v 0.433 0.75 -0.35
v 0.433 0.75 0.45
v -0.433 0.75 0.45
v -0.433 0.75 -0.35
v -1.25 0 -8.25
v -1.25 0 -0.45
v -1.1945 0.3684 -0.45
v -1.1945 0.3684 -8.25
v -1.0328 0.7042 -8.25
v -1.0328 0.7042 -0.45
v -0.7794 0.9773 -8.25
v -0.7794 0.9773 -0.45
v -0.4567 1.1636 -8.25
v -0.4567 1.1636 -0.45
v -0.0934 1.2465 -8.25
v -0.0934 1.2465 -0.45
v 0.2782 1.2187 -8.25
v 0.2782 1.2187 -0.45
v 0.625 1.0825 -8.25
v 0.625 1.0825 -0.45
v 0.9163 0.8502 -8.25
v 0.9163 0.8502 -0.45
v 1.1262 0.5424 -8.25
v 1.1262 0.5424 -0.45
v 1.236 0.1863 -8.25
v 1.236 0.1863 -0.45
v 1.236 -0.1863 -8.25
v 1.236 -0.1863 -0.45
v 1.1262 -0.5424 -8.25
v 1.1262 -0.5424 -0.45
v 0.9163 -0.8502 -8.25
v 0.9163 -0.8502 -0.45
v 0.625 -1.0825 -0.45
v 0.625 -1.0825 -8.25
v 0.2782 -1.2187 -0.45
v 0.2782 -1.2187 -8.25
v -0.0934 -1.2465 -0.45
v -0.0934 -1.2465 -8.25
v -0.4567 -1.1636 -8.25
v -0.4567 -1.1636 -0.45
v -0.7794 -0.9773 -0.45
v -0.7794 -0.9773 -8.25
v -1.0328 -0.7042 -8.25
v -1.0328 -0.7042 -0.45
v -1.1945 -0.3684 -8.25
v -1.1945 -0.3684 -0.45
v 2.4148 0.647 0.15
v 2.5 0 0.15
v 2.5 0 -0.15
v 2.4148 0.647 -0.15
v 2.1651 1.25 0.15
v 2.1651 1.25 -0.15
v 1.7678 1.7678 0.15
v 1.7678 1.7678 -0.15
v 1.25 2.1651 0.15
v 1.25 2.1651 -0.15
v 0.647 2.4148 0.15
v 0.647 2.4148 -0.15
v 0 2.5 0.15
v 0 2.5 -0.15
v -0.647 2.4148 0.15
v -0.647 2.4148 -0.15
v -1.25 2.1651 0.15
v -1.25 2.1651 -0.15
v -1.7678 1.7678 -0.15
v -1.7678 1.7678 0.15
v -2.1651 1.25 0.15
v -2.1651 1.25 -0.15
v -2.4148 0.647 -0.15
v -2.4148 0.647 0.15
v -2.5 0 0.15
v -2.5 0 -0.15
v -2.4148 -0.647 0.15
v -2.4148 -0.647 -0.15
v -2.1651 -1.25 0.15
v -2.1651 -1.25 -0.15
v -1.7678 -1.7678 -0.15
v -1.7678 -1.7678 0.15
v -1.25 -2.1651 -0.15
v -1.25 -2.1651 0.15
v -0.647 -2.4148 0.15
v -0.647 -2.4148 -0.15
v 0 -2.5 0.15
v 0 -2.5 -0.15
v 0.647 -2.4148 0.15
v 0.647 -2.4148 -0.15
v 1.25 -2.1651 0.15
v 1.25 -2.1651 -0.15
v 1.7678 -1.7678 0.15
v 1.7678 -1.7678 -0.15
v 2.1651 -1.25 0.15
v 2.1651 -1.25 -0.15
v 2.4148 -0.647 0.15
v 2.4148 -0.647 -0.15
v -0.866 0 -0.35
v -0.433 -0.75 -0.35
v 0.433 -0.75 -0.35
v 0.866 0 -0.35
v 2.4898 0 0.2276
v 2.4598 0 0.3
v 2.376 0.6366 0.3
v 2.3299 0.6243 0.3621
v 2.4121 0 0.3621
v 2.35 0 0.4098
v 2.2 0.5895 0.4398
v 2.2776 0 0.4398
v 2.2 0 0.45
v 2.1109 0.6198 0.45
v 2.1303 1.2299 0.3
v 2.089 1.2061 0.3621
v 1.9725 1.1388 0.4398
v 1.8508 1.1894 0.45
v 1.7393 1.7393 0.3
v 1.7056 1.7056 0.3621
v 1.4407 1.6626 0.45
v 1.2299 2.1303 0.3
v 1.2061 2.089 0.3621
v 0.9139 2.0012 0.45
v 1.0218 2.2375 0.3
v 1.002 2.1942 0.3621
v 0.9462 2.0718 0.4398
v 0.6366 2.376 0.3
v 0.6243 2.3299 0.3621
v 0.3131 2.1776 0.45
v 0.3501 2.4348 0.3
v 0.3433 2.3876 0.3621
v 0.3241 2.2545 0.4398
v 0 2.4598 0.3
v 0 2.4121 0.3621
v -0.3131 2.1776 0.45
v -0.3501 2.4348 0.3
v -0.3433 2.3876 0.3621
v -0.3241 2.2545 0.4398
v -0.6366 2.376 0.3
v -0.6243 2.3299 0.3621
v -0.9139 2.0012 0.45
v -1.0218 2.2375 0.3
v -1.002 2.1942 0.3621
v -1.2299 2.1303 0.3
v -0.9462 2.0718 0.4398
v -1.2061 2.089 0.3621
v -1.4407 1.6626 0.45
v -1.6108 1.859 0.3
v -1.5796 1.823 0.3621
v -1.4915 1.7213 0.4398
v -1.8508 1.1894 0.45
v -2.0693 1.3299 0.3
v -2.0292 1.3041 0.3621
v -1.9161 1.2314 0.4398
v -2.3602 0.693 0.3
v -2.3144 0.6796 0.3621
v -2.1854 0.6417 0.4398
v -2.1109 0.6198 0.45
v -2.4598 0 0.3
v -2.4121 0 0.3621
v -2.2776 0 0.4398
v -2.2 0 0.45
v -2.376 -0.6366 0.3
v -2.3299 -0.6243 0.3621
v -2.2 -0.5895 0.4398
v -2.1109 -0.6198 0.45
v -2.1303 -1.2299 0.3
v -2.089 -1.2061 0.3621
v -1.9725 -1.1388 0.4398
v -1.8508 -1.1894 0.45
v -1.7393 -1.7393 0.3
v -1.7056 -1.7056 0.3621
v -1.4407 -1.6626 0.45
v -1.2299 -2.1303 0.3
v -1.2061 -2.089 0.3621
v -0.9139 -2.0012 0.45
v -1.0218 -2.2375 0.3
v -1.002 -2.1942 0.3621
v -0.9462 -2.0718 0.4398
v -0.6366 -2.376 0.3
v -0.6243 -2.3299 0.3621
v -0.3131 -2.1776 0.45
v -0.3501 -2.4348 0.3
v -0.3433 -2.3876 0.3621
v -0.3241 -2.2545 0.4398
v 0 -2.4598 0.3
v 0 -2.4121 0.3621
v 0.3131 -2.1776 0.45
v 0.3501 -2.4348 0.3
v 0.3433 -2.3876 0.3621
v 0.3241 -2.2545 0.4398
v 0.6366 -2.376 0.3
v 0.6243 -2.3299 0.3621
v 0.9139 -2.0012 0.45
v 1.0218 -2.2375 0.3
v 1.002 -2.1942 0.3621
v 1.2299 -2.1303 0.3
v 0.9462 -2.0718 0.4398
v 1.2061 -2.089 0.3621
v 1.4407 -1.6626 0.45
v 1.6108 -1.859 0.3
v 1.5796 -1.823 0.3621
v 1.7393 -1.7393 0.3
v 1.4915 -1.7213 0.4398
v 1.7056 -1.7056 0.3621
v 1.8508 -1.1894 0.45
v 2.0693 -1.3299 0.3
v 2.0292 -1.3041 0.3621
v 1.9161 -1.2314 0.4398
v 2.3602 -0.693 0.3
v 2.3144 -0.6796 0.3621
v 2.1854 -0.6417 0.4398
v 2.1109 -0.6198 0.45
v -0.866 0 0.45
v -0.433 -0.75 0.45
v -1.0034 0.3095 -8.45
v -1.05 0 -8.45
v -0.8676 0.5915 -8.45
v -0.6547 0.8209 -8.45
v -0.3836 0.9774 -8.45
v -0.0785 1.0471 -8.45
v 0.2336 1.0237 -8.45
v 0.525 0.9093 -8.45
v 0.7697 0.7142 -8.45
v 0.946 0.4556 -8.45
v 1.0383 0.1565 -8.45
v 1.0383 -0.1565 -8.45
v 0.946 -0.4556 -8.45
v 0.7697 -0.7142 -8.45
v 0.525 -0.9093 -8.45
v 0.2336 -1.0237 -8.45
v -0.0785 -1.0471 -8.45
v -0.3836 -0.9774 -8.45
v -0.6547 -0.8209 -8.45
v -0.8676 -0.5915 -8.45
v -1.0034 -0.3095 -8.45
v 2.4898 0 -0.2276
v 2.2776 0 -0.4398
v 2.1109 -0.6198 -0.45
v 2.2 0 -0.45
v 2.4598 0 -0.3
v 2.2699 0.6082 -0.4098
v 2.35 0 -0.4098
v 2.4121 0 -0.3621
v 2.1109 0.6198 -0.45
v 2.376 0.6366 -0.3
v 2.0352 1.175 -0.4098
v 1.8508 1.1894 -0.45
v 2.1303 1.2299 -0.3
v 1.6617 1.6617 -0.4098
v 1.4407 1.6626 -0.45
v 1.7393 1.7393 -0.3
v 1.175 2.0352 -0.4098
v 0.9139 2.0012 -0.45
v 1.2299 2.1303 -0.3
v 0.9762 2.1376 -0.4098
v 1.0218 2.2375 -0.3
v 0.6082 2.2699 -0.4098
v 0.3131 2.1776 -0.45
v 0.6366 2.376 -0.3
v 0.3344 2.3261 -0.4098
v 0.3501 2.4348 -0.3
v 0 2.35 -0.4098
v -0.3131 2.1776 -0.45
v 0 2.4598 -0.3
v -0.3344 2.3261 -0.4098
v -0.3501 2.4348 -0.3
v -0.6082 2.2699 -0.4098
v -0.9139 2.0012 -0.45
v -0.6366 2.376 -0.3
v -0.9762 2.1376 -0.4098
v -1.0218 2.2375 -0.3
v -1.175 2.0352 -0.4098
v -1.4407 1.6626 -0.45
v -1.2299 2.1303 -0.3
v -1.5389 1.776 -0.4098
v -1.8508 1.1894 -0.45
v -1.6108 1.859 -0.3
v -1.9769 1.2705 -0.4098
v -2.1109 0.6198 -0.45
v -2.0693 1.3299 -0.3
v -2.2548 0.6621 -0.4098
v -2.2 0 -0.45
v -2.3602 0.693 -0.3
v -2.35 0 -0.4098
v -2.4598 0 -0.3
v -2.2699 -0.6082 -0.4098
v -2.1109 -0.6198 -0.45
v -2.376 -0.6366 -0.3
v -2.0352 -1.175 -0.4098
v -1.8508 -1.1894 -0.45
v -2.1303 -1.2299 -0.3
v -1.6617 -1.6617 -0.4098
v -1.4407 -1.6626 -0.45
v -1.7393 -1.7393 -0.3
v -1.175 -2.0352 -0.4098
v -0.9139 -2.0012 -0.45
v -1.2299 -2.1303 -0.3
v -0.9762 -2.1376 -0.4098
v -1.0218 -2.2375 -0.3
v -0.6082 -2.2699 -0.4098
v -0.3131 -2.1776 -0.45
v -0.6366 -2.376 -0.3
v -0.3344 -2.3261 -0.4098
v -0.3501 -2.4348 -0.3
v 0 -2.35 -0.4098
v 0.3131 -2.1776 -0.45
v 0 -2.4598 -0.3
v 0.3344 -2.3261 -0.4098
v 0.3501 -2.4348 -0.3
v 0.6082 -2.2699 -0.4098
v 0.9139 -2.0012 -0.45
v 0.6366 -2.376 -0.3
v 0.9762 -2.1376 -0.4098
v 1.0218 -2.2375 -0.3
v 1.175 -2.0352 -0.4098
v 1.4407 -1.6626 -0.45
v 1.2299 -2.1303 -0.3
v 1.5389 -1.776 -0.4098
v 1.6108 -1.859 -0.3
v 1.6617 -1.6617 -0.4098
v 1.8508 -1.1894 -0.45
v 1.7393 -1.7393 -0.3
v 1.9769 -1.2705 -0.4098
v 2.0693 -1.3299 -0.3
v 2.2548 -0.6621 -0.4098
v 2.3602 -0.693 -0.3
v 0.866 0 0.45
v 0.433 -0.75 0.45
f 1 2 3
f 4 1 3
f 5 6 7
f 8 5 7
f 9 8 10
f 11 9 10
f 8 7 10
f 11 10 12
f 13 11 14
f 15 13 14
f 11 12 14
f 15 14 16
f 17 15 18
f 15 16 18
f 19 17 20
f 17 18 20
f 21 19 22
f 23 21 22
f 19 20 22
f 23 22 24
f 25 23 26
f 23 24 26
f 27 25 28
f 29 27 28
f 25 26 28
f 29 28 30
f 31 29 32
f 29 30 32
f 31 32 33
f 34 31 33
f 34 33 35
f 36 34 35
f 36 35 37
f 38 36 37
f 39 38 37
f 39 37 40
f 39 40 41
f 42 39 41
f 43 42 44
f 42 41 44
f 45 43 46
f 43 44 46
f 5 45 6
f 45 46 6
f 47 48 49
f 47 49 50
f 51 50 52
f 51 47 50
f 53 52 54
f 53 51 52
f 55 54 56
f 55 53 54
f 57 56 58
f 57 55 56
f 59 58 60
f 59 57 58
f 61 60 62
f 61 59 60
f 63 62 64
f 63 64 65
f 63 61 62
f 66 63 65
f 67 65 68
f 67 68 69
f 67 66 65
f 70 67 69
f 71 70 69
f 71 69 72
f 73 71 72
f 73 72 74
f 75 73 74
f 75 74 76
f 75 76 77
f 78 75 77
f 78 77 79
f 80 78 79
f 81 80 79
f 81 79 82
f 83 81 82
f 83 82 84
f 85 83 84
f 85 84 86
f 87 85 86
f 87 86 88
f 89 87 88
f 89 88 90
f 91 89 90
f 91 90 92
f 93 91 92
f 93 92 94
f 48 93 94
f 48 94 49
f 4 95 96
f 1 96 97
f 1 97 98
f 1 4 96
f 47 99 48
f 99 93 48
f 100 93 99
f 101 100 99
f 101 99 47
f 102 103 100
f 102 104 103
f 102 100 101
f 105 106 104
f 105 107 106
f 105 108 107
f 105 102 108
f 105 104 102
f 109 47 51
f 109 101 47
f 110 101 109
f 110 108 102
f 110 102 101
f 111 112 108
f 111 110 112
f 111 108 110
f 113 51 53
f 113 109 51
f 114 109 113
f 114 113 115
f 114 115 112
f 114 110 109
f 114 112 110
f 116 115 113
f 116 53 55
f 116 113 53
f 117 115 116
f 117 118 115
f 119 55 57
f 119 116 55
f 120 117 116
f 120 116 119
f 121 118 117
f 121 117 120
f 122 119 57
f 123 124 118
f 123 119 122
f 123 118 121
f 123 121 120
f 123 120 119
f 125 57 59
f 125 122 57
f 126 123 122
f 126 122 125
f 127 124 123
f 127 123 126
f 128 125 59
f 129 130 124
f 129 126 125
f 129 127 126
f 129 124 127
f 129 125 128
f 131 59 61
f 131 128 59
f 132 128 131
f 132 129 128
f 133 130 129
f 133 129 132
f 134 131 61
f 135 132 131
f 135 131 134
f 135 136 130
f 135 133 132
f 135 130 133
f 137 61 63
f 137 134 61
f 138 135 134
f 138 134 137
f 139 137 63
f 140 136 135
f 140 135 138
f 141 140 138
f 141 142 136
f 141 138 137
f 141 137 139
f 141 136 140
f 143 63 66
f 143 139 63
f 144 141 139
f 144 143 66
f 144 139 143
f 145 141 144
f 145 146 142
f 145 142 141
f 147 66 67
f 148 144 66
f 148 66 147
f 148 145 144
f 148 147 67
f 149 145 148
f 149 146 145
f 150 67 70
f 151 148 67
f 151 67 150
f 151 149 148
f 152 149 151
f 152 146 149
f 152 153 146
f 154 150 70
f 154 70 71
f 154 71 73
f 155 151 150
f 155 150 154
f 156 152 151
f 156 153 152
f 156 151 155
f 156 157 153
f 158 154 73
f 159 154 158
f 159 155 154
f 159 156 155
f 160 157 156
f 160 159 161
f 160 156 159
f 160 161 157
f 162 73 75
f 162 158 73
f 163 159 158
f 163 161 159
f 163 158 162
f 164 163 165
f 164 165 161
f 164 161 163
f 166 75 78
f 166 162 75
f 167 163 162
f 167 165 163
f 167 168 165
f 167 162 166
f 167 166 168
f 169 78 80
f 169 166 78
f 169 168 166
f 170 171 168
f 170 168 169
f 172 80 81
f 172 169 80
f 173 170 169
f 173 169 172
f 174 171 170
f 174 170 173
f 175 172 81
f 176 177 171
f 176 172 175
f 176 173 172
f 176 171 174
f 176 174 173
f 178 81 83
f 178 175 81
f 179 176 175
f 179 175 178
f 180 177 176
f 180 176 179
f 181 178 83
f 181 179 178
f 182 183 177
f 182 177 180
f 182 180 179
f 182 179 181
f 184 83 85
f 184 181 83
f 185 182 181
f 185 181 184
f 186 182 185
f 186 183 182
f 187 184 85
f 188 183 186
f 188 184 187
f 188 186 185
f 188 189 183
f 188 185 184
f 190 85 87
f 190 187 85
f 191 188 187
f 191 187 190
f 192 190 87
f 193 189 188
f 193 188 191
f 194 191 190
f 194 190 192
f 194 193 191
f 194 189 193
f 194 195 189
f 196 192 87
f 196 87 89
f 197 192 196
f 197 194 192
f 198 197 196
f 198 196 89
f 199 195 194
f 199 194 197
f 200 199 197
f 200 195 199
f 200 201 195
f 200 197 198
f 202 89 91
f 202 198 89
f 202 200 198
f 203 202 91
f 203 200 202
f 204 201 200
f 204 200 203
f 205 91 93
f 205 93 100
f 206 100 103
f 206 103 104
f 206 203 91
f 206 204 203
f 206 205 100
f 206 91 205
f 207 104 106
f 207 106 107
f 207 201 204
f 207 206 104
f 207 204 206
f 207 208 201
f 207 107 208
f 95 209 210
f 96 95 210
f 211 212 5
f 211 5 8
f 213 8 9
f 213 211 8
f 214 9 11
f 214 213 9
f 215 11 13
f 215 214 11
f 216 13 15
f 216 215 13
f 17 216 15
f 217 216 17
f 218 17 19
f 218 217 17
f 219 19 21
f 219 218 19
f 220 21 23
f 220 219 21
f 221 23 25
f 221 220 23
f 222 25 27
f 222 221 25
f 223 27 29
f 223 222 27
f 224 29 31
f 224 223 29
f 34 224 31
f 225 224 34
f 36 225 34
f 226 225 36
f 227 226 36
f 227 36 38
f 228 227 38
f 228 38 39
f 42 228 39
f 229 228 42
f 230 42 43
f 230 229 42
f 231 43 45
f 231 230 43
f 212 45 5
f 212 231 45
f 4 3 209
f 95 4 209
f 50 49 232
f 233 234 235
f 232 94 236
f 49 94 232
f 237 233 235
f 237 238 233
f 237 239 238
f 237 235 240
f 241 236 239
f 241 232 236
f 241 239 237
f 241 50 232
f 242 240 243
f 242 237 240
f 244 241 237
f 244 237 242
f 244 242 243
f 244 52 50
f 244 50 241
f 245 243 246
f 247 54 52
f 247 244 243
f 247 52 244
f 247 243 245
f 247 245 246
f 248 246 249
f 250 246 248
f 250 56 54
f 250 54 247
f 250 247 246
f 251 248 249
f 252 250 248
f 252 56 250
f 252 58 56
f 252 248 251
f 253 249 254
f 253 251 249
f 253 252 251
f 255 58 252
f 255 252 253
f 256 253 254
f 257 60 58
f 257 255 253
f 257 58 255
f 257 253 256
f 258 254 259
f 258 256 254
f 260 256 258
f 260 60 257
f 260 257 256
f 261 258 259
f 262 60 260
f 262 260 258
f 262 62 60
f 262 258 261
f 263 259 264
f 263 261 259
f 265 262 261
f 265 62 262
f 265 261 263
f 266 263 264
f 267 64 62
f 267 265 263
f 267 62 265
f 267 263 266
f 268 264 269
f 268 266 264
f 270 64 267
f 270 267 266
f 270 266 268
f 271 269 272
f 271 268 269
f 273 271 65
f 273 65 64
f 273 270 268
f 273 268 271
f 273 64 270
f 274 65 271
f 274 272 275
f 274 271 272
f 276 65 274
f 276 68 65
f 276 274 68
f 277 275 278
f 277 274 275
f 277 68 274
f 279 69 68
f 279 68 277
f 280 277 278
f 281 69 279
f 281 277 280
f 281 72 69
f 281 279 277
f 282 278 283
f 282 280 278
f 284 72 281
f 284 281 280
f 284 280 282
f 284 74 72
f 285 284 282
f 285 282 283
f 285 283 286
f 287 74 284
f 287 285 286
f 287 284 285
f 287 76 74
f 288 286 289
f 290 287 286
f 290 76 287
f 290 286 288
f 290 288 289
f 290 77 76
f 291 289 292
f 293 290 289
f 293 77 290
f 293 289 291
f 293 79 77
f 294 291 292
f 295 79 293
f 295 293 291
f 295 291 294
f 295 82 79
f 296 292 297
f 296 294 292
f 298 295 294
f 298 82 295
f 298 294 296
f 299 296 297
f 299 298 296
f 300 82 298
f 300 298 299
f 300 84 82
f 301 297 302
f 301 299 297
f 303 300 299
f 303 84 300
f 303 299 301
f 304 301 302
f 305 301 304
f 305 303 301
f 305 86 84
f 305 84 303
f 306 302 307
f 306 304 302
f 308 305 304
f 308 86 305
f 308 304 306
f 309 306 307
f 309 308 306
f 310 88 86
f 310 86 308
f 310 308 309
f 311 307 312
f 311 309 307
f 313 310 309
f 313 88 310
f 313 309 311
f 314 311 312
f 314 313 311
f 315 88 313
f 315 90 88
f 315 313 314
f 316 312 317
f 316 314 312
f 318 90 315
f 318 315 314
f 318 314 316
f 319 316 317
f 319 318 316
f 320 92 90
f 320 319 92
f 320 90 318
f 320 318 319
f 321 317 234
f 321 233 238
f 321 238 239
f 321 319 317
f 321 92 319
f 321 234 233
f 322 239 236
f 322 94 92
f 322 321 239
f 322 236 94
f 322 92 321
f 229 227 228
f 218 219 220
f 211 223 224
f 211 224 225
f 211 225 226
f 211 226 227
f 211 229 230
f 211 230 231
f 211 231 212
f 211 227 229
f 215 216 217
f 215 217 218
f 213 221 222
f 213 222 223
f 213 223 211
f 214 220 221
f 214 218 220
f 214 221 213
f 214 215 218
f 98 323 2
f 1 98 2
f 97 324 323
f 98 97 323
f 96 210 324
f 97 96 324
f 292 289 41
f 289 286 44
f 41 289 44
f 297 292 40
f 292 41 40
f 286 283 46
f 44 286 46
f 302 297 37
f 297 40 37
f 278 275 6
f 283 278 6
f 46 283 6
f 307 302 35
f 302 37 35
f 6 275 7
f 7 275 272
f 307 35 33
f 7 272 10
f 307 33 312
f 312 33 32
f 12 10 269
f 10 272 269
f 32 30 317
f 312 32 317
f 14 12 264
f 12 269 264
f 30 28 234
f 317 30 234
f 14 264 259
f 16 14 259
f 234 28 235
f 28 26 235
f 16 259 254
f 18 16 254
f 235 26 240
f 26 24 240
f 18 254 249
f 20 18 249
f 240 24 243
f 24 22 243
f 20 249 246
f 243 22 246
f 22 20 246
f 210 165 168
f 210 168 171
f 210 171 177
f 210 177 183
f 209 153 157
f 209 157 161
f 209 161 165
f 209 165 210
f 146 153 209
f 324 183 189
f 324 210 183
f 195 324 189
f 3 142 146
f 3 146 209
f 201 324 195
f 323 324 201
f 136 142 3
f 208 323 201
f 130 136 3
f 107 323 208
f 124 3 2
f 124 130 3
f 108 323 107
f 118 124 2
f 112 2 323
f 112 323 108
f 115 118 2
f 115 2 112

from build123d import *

# Parameters (mm, degrees)
SKETCH_1_R          = 2.5
EXTRUDE_1_DEPTH     = 0.45
SKETCH_2_R          = 1.25
EXTRUDE_2_DEPTH     = 8
CHAMFER_1_SIZE      = 0.2
CUT_EXTRUDE_1_DEPTH = 0.8
FILLET_2_R          = 0.3


with BuildPart() as part:
    # 草图1 → 凸台-拉伸1 (new body, symmetric)
    with BuildSketch(Plane.XY):
        Circle(SKETCH_1_R)
    extrude(amount=EXTRUDE_1_DEPTH, both=True)

    # 草图2 → 凸台-拉伸2 (add)
    with BuildSketch(Plane(origin=(0, 0, -0.45), x_dir=(-1, 0, 0), z_dir=(0, 0, -1))):
        Circle(SKETCH_2_R)
    extrude(amount=EXTRUDE_2_DEPTH)

    # 倒角1
    chamfer_1_edges = [part.edges().sort_by_distance(p)[0] for p in [
        (1.25, 0, -8.45),
    ]]
    chamfer(chamfer_1_edges, length=CHAMFER_1_SIZE)

    # 草图3 → 切除-拉伸1 (cut)
    with BuildSketch(Plane.XY.offset(0.45)):
        Polygon((0.866025404, 0), (0.433012702, 0.75), (-0.433012702, 0.75), (-0.866025404, 0), (-0.433012702, -0.75), (0.433012702, -0.75), align=None)
    extrude(amount=-CUT_EXTRUDE_1_DEPTH, mode=Mode.SUBTRACT)

    # 圆角2
    fillet_2_edges = [part.edges().sort_by_distance(p)[0] for p in [
        (-2.5, 0, -0.45),
        (-2.5, 0, 0.45),
    ]]
    fillet(fillet_2_edges, radius=FILLET_2_R)


solid = part.part
